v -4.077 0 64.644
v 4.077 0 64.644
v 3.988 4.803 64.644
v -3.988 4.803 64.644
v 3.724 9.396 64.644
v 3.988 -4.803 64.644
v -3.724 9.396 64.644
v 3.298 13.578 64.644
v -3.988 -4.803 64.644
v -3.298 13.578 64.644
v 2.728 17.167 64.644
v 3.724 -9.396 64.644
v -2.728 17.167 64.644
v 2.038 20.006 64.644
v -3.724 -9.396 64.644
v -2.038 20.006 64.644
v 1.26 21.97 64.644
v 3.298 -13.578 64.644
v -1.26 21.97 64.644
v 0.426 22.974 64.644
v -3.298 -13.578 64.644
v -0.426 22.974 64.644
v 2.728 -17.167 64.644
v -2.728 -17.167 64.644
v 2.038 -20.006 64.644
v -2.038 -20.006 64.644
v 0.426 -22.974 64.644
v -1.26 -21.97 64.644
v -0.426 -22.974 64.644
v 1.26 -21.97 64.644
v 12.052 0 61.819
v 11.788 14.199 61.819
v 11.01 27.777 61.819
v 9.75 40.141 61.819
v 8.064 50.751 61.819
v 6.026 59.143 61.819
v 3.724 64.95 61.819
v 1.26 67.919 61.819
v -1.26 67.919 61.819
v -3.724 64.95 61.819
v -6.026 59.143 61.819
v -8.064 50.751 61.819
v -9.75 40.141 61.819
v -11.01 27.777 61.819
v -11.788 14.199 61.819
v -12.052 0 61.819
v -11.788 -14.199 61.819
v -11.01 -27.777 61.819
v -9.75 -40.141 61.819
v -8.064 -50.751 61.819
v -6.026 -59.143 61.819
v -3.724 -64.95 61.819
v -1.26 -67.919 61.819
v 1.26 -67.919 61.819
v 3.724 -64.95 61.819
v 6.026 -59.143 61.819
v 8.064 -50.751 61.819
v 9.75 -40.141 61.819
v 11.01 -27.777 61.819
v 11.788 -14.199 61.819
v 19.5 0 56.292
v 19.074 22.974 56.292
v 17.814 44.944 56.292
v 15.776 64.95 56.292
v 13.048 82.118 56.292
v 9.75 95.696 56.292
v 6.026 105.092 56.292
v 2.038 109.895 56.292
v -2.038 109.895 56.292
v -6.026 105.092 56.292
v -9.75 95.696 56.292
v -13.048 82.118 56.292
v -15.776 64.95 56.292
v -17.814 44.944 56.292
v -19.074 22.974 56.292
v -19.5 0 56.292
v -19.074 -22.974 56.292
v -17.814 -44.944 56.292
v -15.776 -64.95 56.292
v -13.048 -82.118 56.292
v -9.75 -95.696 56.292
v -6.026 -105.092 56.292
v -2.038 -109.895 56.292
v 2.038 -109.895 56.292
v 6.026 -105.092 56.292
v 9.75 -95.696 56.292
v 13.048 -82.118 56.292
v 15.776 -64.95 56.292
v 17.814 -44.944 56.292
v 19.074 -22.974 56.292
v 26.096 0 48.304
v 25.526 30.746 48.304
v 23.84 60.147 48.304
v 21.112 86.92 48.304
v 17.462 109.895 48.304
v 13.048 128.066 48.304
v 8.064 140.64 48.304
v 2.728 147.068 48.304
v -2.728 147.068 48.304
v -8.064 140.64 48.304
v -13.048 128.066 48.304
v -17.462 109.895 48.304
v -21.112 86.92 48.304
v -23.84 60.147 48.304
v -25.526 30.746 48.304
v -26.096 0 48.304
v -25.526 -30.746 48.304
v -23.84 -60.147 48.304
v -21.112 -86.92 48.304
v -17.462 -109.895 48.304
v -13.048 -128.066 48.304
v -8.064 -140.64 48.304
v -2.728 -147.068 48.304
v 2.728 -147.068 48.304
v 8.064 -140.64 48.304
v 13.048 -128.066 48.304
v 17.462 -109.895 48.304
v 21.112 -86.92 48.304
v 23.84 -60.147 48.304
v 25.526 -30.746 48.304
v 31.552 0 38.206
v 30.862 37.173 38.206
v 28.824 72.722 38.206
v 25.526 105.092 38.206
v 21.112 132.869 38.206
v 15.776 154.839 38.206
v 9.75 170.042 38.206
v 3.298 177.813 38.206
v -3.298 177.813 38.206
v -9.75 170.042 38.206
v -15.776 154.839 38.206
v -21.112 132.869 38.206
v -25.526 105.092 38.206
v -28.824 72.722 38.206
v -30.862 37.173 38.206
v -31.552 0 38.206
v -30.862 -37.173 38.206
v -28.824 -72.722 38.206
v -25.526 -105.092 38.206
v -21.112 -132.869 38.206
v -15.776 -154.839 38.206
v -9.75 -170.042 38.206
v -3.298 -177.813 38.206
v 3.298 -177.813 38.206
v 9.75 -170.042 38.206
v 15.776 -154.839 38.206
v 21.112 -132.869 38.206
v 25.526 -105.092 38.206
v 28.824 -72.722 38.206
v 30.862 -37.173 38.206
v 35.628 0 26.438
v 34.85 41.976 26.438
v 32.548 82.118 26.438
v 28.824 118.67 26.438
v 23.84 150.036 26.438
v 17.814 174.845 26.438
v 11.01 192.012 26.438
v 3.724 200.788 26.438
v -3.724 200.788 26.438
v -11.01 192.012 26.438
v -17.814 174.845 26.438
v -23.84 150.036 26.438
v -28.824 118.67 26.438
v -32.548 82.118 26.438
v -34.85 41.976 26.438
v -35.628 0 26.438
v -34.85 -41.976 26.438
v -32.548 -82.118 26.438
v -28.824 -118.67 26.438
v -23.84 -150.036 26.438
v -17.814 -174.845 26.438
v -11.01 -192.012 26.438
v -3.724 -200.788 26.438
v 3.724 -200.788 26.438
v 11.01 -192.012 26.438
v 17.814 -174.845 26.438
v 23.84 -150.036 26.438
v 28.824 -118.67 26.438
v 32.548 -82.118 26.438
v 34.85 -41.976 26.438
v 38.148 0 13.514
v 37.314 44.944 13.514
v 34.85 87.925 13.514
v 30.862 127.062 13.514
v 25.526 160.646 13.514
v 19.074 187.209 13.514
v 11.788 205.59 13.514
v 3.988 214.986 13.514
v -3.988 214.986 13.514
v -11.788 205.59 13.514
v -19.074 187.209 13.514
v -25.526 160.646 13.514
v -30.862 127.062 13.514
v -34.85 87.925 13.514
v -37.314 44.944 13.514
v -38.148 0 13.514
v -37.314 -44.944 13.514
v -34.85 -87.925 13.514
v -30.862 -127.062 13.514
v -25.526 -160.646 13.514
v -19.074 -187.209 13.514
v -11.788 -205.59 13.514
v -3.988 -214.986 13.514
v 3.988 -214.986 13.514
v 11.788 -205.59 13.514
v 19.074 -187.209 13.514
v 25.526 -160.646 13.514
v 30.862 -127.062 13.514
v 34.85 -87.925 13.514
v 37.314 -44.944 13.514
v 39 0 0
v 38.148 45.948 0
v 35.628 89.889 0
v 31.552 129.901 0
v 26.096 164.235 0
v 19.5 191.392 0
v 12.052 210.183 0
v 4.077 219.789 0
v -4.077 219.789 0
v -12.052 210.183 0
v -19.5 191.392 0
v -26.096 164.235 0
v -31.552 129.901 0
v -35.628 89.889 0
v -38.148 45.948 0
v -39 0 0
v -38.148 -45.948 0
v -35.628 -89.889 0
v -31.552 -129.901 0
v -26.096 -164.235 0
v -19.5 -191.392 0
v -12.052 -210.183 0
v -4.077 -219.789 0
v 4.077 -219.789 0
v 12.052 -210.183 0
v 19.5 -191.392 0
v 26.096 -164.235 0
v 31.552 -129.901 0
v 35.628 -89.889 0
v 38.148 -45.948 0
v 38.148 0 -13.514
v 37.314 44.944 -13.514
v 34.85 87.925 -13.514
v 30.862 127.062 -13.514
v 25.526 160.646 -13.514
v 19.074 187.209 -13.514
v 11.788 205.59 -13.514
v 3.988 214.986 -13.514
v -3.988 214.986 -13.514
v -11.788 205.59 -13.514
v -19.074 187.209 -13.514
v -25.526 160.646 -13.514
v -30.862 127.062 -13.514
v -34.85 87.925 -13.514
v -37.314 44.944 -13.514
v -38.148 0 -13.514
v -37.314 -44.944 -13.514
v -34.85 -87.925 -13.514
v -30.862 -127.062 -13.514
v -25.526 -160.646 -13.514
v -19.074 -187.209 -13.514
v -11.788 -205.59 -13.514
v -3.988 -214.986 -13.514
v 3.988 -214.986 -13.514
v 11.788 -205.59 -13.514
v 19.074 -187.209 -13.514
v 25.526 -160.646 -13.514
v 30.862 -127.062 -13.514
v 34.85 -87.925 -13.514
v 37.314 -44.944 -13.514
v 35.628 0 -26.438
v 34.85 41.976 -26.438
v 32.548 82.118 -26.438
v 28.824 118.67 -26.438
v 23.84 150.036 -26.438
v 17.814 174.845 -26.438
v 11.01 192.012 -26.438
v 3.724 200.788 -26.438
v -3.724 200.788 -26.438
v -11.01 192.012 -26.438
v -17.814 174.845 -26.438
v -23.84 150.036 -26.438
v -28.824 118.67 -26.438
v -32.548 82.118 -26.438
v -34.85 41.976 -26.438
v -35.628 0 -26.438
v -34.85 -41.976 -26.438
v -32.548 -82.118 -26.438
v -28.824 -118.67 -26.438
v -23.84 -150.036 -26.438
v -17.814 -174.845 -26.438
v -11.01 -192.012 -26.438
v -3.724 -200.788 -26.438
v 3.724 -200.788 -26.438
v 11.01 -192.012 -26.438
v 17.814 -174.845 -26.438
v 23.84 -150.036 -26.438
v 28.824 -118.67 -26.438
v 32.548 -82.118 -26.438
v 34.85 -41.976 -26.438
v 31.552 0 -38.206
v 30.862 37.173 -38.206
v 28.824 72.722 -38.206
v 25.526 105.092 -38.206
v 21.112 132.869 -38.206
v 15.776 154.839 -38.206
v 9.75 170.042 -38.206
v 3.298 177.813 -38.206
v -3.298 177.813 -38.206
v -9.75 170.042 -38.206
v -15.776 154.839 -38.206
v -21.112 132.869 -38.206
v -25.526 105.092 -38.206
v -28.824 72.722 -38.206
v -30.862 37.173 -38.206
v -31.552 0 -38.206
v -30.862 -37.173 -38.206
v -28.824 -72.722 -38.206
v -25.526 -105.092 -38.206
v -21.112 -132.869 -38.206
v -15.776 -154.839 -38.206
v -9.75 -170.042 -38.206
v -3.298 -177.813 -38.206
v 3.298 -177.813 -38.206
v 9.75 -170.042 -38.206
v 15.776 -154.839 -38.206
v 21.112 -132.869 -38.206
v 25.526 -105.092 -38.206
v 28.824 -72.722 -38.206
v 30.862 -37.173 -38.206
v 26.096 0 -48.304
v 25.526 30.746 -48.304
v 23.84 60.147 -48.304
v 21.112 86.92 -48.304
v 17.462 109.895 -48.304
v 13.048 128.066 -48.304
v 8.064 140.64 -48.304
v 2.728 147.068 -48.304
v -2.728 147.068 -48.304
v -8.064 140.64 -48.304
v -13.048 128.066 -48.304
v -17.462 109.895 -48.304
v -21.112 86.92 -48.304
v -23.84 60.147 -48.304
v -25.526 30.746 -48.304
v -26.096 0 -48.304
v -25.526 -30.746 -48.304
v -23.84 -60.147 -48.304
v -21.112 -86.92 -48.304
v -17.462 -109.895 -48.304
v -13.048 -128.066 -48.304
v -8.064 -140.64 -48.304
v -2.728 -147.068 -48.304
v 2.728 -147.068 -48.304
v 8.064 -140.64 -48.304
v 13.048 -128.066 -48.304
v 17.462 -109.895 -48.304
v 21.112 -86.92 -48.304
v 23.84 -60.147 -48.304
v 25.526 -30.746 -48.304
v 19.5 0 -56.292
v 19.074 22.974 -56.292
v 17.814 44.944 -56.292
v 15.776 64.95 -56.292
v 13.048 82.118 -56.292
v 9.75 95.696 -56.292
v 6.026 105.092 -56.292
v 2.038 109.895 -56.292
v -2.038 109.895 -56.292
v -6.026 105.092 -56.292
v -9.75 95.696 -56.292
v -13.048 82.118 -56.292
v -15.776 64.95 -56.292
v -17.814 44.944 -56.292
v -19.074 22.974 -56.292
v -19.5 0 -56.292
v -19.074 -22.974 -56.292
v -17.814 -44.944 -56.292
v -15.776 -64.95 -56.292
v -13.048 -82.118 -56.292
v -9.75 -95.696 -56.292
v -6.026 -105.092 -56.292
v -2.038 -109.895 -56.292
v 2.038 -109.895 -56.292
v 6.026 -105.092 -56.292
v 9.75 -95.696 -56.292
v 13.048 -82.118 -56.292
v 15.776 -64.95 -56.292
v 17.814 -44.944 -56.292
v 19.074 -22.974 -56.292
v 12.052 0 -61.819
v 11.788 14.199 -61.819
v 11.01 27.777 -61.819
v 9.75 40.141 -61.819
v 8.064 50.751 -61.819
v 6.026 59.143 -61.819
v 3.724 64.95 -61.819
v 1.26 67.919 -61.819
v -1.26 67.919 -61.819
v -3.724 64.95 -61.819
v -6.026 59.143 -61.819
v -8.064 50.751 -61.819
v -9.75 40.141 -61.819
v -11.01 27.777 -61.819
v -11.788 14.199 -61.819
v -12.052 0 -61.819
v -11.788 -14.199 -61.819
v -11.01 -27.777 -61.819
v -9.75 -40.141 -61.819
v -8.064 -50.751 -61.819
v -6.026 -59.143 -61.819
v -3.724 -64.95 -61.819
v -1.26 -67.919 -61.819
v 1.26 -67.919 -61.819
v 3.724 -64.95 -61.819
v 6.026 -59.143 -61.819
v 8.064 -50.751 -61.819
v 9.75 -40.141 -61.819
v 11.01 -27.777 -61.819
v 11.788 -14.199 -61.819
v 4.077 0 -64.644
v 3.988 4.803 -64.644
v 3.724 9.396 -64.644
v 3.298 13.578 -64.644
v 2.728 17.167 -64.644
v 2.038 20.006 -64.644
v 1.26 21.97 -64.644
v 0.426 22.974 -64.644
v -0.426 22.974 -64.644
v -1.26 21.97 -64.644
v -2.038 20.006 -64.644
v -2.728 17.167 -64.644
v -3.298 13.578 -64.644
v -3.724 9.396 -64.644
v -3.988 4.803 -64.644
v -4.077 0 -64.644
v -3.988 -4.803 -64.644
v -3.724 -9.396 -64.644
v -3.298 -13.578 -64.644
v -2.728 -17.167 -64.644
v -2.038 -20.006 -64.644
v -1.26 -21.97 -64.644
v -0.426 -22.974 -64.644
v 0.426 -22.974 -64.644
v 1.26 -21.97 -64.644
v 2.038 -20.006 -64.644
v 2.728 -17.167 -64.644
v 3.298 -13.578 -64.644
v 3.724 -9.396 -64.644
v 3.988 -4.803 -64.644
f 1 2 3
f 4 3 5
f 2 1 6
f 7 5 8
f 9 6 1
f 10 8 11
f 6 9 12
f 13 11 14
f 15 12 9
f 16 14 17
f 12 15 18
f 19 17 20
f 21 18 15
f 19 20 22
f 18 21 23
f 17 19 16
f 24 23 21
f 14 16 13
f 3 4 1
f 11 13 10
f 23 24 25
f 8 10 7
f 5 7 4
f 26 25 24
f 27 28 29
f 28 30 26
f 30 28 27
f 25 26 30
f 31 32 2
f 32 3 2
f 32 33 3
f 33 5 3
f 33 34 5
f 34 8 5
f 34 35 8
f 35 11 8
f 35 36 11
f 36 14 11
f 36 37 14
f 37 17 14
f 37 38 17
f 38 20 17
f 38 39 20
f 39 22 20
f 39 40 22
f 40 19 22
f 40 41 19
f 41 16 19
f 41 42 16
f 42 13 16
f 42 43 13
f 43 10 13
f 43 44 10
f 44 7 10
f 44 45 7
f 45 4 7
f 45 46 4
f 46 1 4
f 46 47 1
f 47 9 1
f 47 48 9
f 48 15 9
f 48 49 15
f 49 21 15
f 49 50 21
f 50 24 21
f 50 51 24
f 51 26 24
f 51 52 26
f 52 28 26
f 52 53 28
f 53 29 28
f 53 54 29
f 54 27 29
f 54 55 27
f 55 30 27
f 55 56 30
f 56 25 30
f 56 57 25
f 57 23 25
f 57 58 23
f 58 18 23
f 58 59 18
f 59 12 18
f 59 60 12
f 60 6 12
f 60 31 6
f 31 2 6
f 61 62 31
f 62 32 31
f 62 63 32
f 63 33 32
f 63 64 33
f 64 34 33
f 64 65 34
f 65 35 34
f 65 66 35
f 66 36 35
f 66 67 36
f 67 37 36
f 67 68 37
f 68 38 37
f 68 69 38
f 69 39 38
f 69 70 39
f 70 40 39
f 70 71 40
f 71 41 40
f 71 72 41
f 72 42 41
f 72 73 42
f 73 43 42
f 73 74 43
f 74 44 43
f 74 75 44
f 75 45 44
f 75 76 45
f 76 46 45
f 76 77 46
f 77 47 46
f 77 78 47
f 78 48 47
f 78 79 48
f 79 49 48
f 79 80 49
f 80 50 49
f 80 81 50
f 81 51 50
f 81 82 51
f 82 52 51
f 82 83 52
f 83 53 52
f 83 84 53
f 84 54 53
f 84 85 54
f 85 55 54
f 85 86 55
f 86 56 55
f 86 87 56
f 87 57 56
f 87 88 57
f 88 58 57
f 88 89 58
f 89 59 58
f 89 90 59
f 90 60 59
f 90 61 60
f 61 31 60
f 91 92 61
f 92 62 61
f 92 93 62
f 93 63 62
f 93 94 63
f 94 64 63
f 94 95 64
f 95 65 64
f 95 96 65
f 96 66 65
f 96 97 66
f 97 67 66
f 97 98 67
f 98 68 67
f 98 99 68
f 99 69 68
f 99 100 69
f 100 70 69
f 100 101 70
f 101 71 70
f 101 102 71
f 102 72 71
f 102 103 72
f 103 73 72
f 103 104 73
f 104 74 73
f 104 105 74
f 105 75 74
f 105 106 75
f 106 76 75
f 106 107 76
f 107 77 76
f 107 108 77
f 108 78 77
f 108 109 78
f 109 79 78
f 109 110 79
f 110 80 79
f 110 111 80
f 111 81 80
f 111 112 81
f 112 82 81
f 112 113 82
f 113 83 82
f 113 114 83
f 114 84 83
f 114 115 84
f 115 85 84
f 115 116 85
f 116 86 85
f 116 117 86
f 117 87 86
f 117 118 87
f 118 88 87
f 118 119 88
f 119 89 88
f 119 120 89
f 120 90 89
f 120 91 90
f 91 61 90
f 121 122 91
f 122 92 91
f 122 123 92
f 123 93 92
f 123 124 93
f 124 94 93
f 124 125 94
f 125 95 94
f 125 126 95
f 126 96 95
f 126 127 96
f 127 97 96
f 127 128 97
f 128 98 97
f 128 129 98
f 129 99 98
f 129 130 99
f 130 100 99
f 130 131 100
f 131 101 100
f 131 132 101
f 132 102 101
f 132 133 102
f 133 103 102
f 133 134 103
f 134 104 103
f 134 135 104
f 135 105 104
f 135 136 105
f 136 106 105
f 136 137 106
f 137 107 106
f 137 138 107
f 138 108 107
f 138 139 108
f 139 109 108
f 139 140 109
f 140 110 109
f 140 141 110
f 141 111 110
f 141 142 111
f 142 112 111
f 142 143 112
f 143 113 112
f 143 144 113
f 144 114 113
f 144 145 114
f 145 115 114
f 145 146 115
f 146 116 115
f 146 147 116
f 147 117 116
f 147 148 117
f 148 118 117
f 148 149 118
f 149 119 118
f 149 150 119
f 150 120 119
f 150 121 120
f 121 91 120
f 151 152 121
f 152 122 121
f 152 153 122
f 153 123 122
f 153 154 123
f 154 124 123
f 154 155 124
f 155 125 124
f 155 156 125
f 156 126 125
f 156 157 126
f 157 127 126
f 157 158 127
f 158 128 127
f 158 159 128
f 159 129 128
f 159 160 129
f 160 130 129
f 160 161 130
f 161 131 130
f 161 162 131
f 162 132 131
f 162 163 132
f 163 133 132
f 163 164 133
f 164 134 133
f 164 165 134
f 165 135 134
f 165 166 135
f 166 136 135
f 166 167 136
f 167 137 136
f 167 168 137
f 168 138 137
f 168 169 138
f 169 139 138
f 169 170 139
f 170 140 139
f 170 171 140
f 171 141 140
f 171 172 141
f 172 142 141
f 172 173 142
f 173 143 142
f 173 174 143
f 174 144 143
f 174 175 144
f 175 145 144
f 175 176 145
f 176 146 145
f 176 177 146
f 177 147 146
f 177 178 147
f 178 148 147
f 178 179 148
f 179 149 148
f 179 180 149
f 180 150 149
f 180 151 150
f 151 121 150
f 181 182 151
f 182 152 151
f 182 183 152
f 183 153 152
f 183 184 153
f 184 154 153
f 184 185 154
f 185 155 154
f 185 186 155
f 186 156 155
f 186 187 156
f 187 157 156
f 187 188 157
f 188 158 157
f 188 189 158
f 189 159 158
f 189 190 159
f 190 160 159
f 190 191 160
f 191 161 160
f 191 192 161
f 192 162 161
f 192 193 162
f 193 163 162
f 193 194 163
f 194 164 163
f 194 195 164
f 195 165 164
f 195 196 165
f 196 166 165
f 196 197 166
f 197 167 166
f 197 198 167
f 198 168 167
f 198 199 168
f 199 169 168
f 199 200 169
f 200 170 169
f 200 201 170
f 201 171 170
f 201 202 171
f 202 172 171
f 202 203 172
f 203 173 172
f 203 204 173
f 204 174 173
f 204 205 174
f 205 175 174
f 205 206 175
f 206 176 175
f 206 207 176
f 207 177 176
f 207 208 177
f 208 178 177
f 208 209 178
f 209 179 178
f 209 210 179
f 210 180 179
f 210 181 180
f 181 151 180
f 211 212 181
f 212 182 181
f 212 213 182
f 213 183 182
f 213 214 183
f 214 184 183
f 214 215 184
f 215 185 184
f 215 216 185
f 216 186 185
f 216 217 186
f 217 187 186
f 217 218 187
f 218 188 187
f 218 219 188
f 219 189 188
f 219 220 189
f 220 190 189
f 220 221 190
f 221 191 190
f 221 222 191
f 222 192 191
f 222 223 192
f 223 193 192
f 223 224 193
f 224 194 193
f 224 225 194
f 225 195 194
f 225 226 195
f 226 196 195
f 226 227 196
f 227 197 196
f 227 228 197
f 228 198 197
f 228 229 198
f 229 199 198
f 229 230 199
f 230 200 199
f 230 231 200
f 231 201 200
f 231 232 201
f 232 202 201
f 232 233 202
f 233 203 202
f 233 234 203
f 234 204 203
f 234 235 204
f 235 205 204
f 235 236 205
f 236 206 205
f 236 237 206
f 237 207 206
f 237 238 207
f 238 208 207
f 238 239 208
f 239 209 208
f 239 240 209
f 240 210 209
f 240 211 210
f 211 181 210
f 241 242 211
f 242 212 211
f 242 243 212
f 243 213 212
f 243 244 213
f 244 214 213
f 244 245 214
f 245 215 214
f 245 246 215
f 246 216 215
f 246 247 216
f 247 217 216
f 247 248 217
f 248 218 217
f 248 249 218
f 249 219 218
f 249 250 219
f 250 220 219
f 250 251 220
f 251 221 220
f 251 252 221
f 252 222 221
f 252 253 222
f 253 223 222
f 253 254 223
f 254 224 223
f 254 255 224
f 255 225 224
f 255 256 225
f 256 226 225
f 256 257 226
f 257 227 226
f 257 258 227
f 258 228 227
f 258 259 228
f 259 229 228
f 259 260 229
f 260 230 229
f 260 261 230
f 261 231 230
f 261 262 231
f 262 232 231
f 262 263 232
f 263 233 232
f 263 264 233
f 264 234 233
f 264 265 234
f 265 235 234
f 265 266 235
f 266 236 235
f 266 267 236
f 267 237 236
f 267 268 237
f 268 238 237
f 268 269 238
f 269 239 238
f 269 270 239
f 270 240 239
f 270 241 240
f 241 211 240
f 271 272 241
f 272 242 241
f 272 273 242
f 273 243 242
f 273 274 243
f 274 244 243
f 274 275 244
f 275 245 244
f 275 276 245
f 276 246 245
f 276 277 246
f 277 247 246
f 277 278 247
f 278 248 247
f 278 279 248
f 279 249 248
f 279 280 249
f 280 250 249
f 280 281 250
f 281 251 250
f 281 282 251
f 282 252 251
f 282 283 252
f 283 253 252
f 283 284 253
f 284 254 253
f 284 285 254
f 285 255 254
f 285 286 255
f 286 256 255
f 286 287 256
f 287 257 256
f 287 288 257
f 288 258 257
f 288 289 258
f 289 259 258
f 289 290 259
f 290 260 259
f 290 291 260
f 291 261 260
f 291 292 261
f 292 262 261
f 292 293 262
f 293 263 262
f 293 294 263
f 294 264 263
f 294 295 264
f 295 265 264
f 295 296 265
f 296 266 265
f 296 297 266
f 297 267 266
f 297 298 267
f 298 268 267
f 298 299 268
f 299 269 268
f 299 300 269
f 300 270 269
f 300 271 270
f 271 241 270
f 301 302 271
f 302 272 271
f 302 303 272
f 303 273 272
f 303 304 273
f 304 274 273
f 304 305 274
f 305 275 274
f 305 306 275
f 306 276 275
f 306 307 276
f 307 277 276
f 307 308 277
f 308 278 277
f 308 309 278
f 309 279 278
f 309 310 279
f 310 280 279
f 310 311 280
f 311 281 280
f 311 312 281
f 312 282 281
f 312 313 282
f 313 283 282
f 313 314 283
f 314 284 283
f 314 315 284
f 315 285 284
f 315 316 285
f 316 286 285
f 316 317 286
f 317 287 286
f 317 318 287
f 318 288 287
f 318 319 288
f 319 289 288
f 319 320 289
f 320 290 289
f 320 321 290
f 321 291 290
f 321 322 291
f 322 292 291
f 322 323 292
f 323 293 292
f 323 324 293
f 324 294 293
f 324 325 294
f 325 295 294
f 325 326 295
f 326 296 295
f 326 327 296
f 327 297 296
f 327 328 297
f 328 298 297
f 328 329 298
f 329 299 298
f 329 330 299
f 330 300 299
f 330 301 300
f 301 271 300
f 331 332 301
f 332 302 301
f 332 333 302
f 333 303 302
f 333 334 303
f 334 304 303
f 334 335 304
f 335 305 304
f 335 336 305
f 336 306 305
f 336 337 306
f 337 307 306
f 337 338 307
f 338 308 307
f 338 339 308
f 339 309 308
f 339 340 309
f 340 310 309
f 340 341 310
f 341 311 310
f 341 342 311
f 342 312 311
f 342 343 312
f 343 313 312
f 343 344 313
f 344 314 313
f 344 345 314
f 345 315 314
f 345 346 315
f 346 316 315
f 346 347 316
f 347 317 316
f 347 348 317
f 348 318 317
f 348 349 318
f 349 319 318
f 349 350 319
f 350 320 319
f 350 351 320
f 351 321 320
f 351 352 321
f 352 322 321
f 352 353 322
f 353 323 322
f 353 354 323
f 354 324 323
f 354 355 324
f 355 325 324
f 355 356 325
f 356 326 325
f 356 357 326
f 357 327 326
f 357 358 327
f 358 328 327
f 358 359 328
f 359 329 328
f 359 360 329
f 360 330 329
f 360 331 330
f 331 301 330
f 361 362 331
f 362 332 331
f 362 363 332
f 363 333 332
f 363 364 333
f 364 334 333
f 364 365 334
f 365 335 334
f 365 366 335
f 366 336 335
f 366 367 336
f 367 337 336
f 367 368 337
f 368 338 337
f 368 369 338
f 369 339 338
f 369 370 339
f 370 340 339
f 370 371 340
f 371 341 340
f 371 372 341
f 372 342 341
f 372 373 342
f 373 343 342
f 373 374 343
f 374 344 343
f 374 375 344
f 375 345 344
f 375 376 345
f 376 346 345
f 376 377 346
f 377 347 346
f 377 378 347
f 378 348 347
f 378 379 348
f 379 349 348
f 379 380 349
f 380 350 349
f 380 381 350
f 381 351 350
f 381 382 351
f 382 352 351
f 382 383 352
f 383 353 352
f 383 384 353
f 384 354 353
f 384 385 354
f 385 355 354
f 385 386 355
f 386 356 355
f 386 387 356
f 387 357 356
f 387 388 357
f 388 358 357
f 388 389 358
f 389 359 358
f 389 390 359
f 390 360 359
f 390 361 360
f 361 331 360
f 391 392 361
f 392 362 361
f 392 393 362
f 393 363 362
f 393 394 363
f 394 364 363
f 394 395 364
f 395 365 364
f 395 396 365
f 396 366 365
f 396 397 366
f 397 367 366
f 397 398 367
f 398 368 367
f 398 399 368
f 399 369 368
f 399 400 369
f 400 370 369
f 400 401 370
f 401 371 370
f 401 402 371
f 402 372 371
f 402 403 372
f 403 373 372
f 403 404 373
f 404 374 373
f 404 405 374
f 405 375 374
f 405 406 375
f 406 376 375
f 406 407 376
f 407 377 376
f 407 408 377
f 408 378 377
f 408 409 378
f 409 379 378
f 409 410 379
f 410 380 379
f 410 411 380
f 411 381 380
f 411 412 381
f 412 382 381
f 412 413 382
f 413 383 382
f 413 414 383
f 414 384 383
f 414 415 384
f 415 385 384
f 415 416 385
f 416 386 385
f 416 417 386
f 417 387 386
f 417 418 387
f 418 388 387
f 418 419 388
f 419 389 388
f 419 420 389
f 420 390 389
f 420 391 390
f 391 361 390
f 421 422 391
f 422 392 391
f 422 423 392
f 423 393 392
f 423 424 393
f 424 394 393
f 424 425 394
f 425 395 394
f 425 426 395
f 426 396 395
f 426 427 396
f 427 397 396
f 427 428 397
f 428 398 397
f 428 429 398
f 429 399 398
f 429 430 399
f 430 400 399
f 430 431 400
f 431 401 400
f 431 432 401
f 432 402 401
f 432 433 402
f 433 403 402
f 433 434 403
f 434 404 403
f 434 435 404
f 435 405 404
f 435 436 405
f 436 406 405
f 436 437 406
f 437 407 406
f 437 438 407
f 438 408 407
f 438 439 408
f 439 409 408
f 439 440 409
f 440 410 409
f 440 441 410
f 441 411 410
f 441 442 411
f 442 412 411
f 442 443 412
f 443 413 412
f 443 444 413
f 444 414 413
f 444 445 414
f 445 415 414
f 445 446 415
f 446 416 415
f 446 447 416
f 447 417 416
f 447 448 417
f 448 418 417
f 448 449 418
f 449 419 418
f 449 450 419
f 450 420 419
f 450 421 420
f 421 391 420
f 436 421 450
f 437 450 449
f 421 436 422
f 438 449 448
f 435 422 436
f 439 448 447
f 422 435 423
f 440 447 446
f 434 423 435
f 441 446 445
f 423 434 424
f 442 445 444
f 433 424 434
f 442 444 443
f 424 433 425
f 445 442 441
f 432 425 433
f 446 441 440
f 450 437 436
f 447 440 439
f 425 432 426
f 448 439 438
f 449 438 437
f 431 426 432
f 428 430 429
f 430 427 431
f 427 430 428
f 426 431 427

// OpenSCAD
// Generated by SolidPython 1.0.1 on 2020-07-29 00:46:45


scale(v = [3, 17, 5]) {
	sphere(r = 13);
}
/***********************************************
*********      SolidPython code:      **********
************************************************
 
# import packages: SolidPython
from solid import *
from solid.utils import *
from itertools import chain, combinations, permutations


class Resize:

    def __init__(self, scad_file):
        self.scad_file = scad_file
        #self.scad_file = import_scad(scad_file)
        # cone/cylinder param:
        self.r1 = 0
        self.r2 = 0
        self.h = 0
        # rectangular prism param:
        self.w = 0
        self.l = 0
        # ellipse param:
        self.r = 0

    # import OpenScad code (file name corresponds to shape)


    # classify shape + parameters
    def assign(self, param1, param2, param3):
        if self.scad_file == 'cone.scad':
            self.r1 = param1
            self.r2 = param2
            self.h = param3
        elif self.scad_file == 'cylinder.scad':
            self.r1 = param1
            self.r2 = param2
            self.h = param3
        elif self.scad_file == 'rectangularPrism.scad':
            self.h = param1
            self.l = param2
            self.w = param3
        else:
            self.r = param1
            self.h = param2

    # resize parameters
    def iterate(self):
        x = range(3, 20, 2)
        i = 1
        if self.scad_file == 'cone.scad':
            tempList = list(permutations(x, 2))
            for temp in tempList:
                param1 = temp[0]
                param2 = temp[1]
                filepath = 'produced_scad_files/' + 'cone' + str(param1) + '_' + str(param2) + '_' + '.scad'
                scad_render_to_file(cylinder(h=param1, r1=param2, r2=0), filepath)

        elif self.scad_file == 'cylinder.scad':
            tempList = list(permutations(x, 3))
            for temp in tempList:
                param1 = temp[0]
                param2 = temp[1]
                filepath = 'produced_scad_files/' + 'cylinder' + str(param1) + '_' + str(param2) + '_' + '.scad'
                scad_render_to_file(cylinder(h=param1, r1=param2, r2=param2), filepath)

        elif self.scad_file == 'rectangularPrism.scad':
            tempList = list(permutations(x, 3))
            for temp in tempList:
                param1 = temp[0]
                param2 = temp[1]
                param3 = temp[2]
                filepath = 'produced_scad_files/' + 'rectangularPrism' + str(param1) + '_' + str(param2) + '_' + str(
                    param3) + '.scad'
                scad_render_to_file(cube(size=(param1, param2, param3)), filepath)

        elif self.scad_file == 'ellipse.scad':
            tempList = list(permutations(x, 4))
            for temp in tempList:
                param1 = temp[0]
                param2 = temp[1]
                param3 = temp[2]
                param4 = temp[3]
                filepath = 'produced_scad_files/' + 'ellipse' + str(param1) + '_' + str(param2) + '_' + str(param3) + '_' + str(param4) + '.scad'
                scad_render_to_file(scale([param1, param2, param3])(sphere(r=param4)), filepath)

    def render_to_scadfile(self):
        scad_render_to_file(scad, 'example.scad') 
 
************************************************/
